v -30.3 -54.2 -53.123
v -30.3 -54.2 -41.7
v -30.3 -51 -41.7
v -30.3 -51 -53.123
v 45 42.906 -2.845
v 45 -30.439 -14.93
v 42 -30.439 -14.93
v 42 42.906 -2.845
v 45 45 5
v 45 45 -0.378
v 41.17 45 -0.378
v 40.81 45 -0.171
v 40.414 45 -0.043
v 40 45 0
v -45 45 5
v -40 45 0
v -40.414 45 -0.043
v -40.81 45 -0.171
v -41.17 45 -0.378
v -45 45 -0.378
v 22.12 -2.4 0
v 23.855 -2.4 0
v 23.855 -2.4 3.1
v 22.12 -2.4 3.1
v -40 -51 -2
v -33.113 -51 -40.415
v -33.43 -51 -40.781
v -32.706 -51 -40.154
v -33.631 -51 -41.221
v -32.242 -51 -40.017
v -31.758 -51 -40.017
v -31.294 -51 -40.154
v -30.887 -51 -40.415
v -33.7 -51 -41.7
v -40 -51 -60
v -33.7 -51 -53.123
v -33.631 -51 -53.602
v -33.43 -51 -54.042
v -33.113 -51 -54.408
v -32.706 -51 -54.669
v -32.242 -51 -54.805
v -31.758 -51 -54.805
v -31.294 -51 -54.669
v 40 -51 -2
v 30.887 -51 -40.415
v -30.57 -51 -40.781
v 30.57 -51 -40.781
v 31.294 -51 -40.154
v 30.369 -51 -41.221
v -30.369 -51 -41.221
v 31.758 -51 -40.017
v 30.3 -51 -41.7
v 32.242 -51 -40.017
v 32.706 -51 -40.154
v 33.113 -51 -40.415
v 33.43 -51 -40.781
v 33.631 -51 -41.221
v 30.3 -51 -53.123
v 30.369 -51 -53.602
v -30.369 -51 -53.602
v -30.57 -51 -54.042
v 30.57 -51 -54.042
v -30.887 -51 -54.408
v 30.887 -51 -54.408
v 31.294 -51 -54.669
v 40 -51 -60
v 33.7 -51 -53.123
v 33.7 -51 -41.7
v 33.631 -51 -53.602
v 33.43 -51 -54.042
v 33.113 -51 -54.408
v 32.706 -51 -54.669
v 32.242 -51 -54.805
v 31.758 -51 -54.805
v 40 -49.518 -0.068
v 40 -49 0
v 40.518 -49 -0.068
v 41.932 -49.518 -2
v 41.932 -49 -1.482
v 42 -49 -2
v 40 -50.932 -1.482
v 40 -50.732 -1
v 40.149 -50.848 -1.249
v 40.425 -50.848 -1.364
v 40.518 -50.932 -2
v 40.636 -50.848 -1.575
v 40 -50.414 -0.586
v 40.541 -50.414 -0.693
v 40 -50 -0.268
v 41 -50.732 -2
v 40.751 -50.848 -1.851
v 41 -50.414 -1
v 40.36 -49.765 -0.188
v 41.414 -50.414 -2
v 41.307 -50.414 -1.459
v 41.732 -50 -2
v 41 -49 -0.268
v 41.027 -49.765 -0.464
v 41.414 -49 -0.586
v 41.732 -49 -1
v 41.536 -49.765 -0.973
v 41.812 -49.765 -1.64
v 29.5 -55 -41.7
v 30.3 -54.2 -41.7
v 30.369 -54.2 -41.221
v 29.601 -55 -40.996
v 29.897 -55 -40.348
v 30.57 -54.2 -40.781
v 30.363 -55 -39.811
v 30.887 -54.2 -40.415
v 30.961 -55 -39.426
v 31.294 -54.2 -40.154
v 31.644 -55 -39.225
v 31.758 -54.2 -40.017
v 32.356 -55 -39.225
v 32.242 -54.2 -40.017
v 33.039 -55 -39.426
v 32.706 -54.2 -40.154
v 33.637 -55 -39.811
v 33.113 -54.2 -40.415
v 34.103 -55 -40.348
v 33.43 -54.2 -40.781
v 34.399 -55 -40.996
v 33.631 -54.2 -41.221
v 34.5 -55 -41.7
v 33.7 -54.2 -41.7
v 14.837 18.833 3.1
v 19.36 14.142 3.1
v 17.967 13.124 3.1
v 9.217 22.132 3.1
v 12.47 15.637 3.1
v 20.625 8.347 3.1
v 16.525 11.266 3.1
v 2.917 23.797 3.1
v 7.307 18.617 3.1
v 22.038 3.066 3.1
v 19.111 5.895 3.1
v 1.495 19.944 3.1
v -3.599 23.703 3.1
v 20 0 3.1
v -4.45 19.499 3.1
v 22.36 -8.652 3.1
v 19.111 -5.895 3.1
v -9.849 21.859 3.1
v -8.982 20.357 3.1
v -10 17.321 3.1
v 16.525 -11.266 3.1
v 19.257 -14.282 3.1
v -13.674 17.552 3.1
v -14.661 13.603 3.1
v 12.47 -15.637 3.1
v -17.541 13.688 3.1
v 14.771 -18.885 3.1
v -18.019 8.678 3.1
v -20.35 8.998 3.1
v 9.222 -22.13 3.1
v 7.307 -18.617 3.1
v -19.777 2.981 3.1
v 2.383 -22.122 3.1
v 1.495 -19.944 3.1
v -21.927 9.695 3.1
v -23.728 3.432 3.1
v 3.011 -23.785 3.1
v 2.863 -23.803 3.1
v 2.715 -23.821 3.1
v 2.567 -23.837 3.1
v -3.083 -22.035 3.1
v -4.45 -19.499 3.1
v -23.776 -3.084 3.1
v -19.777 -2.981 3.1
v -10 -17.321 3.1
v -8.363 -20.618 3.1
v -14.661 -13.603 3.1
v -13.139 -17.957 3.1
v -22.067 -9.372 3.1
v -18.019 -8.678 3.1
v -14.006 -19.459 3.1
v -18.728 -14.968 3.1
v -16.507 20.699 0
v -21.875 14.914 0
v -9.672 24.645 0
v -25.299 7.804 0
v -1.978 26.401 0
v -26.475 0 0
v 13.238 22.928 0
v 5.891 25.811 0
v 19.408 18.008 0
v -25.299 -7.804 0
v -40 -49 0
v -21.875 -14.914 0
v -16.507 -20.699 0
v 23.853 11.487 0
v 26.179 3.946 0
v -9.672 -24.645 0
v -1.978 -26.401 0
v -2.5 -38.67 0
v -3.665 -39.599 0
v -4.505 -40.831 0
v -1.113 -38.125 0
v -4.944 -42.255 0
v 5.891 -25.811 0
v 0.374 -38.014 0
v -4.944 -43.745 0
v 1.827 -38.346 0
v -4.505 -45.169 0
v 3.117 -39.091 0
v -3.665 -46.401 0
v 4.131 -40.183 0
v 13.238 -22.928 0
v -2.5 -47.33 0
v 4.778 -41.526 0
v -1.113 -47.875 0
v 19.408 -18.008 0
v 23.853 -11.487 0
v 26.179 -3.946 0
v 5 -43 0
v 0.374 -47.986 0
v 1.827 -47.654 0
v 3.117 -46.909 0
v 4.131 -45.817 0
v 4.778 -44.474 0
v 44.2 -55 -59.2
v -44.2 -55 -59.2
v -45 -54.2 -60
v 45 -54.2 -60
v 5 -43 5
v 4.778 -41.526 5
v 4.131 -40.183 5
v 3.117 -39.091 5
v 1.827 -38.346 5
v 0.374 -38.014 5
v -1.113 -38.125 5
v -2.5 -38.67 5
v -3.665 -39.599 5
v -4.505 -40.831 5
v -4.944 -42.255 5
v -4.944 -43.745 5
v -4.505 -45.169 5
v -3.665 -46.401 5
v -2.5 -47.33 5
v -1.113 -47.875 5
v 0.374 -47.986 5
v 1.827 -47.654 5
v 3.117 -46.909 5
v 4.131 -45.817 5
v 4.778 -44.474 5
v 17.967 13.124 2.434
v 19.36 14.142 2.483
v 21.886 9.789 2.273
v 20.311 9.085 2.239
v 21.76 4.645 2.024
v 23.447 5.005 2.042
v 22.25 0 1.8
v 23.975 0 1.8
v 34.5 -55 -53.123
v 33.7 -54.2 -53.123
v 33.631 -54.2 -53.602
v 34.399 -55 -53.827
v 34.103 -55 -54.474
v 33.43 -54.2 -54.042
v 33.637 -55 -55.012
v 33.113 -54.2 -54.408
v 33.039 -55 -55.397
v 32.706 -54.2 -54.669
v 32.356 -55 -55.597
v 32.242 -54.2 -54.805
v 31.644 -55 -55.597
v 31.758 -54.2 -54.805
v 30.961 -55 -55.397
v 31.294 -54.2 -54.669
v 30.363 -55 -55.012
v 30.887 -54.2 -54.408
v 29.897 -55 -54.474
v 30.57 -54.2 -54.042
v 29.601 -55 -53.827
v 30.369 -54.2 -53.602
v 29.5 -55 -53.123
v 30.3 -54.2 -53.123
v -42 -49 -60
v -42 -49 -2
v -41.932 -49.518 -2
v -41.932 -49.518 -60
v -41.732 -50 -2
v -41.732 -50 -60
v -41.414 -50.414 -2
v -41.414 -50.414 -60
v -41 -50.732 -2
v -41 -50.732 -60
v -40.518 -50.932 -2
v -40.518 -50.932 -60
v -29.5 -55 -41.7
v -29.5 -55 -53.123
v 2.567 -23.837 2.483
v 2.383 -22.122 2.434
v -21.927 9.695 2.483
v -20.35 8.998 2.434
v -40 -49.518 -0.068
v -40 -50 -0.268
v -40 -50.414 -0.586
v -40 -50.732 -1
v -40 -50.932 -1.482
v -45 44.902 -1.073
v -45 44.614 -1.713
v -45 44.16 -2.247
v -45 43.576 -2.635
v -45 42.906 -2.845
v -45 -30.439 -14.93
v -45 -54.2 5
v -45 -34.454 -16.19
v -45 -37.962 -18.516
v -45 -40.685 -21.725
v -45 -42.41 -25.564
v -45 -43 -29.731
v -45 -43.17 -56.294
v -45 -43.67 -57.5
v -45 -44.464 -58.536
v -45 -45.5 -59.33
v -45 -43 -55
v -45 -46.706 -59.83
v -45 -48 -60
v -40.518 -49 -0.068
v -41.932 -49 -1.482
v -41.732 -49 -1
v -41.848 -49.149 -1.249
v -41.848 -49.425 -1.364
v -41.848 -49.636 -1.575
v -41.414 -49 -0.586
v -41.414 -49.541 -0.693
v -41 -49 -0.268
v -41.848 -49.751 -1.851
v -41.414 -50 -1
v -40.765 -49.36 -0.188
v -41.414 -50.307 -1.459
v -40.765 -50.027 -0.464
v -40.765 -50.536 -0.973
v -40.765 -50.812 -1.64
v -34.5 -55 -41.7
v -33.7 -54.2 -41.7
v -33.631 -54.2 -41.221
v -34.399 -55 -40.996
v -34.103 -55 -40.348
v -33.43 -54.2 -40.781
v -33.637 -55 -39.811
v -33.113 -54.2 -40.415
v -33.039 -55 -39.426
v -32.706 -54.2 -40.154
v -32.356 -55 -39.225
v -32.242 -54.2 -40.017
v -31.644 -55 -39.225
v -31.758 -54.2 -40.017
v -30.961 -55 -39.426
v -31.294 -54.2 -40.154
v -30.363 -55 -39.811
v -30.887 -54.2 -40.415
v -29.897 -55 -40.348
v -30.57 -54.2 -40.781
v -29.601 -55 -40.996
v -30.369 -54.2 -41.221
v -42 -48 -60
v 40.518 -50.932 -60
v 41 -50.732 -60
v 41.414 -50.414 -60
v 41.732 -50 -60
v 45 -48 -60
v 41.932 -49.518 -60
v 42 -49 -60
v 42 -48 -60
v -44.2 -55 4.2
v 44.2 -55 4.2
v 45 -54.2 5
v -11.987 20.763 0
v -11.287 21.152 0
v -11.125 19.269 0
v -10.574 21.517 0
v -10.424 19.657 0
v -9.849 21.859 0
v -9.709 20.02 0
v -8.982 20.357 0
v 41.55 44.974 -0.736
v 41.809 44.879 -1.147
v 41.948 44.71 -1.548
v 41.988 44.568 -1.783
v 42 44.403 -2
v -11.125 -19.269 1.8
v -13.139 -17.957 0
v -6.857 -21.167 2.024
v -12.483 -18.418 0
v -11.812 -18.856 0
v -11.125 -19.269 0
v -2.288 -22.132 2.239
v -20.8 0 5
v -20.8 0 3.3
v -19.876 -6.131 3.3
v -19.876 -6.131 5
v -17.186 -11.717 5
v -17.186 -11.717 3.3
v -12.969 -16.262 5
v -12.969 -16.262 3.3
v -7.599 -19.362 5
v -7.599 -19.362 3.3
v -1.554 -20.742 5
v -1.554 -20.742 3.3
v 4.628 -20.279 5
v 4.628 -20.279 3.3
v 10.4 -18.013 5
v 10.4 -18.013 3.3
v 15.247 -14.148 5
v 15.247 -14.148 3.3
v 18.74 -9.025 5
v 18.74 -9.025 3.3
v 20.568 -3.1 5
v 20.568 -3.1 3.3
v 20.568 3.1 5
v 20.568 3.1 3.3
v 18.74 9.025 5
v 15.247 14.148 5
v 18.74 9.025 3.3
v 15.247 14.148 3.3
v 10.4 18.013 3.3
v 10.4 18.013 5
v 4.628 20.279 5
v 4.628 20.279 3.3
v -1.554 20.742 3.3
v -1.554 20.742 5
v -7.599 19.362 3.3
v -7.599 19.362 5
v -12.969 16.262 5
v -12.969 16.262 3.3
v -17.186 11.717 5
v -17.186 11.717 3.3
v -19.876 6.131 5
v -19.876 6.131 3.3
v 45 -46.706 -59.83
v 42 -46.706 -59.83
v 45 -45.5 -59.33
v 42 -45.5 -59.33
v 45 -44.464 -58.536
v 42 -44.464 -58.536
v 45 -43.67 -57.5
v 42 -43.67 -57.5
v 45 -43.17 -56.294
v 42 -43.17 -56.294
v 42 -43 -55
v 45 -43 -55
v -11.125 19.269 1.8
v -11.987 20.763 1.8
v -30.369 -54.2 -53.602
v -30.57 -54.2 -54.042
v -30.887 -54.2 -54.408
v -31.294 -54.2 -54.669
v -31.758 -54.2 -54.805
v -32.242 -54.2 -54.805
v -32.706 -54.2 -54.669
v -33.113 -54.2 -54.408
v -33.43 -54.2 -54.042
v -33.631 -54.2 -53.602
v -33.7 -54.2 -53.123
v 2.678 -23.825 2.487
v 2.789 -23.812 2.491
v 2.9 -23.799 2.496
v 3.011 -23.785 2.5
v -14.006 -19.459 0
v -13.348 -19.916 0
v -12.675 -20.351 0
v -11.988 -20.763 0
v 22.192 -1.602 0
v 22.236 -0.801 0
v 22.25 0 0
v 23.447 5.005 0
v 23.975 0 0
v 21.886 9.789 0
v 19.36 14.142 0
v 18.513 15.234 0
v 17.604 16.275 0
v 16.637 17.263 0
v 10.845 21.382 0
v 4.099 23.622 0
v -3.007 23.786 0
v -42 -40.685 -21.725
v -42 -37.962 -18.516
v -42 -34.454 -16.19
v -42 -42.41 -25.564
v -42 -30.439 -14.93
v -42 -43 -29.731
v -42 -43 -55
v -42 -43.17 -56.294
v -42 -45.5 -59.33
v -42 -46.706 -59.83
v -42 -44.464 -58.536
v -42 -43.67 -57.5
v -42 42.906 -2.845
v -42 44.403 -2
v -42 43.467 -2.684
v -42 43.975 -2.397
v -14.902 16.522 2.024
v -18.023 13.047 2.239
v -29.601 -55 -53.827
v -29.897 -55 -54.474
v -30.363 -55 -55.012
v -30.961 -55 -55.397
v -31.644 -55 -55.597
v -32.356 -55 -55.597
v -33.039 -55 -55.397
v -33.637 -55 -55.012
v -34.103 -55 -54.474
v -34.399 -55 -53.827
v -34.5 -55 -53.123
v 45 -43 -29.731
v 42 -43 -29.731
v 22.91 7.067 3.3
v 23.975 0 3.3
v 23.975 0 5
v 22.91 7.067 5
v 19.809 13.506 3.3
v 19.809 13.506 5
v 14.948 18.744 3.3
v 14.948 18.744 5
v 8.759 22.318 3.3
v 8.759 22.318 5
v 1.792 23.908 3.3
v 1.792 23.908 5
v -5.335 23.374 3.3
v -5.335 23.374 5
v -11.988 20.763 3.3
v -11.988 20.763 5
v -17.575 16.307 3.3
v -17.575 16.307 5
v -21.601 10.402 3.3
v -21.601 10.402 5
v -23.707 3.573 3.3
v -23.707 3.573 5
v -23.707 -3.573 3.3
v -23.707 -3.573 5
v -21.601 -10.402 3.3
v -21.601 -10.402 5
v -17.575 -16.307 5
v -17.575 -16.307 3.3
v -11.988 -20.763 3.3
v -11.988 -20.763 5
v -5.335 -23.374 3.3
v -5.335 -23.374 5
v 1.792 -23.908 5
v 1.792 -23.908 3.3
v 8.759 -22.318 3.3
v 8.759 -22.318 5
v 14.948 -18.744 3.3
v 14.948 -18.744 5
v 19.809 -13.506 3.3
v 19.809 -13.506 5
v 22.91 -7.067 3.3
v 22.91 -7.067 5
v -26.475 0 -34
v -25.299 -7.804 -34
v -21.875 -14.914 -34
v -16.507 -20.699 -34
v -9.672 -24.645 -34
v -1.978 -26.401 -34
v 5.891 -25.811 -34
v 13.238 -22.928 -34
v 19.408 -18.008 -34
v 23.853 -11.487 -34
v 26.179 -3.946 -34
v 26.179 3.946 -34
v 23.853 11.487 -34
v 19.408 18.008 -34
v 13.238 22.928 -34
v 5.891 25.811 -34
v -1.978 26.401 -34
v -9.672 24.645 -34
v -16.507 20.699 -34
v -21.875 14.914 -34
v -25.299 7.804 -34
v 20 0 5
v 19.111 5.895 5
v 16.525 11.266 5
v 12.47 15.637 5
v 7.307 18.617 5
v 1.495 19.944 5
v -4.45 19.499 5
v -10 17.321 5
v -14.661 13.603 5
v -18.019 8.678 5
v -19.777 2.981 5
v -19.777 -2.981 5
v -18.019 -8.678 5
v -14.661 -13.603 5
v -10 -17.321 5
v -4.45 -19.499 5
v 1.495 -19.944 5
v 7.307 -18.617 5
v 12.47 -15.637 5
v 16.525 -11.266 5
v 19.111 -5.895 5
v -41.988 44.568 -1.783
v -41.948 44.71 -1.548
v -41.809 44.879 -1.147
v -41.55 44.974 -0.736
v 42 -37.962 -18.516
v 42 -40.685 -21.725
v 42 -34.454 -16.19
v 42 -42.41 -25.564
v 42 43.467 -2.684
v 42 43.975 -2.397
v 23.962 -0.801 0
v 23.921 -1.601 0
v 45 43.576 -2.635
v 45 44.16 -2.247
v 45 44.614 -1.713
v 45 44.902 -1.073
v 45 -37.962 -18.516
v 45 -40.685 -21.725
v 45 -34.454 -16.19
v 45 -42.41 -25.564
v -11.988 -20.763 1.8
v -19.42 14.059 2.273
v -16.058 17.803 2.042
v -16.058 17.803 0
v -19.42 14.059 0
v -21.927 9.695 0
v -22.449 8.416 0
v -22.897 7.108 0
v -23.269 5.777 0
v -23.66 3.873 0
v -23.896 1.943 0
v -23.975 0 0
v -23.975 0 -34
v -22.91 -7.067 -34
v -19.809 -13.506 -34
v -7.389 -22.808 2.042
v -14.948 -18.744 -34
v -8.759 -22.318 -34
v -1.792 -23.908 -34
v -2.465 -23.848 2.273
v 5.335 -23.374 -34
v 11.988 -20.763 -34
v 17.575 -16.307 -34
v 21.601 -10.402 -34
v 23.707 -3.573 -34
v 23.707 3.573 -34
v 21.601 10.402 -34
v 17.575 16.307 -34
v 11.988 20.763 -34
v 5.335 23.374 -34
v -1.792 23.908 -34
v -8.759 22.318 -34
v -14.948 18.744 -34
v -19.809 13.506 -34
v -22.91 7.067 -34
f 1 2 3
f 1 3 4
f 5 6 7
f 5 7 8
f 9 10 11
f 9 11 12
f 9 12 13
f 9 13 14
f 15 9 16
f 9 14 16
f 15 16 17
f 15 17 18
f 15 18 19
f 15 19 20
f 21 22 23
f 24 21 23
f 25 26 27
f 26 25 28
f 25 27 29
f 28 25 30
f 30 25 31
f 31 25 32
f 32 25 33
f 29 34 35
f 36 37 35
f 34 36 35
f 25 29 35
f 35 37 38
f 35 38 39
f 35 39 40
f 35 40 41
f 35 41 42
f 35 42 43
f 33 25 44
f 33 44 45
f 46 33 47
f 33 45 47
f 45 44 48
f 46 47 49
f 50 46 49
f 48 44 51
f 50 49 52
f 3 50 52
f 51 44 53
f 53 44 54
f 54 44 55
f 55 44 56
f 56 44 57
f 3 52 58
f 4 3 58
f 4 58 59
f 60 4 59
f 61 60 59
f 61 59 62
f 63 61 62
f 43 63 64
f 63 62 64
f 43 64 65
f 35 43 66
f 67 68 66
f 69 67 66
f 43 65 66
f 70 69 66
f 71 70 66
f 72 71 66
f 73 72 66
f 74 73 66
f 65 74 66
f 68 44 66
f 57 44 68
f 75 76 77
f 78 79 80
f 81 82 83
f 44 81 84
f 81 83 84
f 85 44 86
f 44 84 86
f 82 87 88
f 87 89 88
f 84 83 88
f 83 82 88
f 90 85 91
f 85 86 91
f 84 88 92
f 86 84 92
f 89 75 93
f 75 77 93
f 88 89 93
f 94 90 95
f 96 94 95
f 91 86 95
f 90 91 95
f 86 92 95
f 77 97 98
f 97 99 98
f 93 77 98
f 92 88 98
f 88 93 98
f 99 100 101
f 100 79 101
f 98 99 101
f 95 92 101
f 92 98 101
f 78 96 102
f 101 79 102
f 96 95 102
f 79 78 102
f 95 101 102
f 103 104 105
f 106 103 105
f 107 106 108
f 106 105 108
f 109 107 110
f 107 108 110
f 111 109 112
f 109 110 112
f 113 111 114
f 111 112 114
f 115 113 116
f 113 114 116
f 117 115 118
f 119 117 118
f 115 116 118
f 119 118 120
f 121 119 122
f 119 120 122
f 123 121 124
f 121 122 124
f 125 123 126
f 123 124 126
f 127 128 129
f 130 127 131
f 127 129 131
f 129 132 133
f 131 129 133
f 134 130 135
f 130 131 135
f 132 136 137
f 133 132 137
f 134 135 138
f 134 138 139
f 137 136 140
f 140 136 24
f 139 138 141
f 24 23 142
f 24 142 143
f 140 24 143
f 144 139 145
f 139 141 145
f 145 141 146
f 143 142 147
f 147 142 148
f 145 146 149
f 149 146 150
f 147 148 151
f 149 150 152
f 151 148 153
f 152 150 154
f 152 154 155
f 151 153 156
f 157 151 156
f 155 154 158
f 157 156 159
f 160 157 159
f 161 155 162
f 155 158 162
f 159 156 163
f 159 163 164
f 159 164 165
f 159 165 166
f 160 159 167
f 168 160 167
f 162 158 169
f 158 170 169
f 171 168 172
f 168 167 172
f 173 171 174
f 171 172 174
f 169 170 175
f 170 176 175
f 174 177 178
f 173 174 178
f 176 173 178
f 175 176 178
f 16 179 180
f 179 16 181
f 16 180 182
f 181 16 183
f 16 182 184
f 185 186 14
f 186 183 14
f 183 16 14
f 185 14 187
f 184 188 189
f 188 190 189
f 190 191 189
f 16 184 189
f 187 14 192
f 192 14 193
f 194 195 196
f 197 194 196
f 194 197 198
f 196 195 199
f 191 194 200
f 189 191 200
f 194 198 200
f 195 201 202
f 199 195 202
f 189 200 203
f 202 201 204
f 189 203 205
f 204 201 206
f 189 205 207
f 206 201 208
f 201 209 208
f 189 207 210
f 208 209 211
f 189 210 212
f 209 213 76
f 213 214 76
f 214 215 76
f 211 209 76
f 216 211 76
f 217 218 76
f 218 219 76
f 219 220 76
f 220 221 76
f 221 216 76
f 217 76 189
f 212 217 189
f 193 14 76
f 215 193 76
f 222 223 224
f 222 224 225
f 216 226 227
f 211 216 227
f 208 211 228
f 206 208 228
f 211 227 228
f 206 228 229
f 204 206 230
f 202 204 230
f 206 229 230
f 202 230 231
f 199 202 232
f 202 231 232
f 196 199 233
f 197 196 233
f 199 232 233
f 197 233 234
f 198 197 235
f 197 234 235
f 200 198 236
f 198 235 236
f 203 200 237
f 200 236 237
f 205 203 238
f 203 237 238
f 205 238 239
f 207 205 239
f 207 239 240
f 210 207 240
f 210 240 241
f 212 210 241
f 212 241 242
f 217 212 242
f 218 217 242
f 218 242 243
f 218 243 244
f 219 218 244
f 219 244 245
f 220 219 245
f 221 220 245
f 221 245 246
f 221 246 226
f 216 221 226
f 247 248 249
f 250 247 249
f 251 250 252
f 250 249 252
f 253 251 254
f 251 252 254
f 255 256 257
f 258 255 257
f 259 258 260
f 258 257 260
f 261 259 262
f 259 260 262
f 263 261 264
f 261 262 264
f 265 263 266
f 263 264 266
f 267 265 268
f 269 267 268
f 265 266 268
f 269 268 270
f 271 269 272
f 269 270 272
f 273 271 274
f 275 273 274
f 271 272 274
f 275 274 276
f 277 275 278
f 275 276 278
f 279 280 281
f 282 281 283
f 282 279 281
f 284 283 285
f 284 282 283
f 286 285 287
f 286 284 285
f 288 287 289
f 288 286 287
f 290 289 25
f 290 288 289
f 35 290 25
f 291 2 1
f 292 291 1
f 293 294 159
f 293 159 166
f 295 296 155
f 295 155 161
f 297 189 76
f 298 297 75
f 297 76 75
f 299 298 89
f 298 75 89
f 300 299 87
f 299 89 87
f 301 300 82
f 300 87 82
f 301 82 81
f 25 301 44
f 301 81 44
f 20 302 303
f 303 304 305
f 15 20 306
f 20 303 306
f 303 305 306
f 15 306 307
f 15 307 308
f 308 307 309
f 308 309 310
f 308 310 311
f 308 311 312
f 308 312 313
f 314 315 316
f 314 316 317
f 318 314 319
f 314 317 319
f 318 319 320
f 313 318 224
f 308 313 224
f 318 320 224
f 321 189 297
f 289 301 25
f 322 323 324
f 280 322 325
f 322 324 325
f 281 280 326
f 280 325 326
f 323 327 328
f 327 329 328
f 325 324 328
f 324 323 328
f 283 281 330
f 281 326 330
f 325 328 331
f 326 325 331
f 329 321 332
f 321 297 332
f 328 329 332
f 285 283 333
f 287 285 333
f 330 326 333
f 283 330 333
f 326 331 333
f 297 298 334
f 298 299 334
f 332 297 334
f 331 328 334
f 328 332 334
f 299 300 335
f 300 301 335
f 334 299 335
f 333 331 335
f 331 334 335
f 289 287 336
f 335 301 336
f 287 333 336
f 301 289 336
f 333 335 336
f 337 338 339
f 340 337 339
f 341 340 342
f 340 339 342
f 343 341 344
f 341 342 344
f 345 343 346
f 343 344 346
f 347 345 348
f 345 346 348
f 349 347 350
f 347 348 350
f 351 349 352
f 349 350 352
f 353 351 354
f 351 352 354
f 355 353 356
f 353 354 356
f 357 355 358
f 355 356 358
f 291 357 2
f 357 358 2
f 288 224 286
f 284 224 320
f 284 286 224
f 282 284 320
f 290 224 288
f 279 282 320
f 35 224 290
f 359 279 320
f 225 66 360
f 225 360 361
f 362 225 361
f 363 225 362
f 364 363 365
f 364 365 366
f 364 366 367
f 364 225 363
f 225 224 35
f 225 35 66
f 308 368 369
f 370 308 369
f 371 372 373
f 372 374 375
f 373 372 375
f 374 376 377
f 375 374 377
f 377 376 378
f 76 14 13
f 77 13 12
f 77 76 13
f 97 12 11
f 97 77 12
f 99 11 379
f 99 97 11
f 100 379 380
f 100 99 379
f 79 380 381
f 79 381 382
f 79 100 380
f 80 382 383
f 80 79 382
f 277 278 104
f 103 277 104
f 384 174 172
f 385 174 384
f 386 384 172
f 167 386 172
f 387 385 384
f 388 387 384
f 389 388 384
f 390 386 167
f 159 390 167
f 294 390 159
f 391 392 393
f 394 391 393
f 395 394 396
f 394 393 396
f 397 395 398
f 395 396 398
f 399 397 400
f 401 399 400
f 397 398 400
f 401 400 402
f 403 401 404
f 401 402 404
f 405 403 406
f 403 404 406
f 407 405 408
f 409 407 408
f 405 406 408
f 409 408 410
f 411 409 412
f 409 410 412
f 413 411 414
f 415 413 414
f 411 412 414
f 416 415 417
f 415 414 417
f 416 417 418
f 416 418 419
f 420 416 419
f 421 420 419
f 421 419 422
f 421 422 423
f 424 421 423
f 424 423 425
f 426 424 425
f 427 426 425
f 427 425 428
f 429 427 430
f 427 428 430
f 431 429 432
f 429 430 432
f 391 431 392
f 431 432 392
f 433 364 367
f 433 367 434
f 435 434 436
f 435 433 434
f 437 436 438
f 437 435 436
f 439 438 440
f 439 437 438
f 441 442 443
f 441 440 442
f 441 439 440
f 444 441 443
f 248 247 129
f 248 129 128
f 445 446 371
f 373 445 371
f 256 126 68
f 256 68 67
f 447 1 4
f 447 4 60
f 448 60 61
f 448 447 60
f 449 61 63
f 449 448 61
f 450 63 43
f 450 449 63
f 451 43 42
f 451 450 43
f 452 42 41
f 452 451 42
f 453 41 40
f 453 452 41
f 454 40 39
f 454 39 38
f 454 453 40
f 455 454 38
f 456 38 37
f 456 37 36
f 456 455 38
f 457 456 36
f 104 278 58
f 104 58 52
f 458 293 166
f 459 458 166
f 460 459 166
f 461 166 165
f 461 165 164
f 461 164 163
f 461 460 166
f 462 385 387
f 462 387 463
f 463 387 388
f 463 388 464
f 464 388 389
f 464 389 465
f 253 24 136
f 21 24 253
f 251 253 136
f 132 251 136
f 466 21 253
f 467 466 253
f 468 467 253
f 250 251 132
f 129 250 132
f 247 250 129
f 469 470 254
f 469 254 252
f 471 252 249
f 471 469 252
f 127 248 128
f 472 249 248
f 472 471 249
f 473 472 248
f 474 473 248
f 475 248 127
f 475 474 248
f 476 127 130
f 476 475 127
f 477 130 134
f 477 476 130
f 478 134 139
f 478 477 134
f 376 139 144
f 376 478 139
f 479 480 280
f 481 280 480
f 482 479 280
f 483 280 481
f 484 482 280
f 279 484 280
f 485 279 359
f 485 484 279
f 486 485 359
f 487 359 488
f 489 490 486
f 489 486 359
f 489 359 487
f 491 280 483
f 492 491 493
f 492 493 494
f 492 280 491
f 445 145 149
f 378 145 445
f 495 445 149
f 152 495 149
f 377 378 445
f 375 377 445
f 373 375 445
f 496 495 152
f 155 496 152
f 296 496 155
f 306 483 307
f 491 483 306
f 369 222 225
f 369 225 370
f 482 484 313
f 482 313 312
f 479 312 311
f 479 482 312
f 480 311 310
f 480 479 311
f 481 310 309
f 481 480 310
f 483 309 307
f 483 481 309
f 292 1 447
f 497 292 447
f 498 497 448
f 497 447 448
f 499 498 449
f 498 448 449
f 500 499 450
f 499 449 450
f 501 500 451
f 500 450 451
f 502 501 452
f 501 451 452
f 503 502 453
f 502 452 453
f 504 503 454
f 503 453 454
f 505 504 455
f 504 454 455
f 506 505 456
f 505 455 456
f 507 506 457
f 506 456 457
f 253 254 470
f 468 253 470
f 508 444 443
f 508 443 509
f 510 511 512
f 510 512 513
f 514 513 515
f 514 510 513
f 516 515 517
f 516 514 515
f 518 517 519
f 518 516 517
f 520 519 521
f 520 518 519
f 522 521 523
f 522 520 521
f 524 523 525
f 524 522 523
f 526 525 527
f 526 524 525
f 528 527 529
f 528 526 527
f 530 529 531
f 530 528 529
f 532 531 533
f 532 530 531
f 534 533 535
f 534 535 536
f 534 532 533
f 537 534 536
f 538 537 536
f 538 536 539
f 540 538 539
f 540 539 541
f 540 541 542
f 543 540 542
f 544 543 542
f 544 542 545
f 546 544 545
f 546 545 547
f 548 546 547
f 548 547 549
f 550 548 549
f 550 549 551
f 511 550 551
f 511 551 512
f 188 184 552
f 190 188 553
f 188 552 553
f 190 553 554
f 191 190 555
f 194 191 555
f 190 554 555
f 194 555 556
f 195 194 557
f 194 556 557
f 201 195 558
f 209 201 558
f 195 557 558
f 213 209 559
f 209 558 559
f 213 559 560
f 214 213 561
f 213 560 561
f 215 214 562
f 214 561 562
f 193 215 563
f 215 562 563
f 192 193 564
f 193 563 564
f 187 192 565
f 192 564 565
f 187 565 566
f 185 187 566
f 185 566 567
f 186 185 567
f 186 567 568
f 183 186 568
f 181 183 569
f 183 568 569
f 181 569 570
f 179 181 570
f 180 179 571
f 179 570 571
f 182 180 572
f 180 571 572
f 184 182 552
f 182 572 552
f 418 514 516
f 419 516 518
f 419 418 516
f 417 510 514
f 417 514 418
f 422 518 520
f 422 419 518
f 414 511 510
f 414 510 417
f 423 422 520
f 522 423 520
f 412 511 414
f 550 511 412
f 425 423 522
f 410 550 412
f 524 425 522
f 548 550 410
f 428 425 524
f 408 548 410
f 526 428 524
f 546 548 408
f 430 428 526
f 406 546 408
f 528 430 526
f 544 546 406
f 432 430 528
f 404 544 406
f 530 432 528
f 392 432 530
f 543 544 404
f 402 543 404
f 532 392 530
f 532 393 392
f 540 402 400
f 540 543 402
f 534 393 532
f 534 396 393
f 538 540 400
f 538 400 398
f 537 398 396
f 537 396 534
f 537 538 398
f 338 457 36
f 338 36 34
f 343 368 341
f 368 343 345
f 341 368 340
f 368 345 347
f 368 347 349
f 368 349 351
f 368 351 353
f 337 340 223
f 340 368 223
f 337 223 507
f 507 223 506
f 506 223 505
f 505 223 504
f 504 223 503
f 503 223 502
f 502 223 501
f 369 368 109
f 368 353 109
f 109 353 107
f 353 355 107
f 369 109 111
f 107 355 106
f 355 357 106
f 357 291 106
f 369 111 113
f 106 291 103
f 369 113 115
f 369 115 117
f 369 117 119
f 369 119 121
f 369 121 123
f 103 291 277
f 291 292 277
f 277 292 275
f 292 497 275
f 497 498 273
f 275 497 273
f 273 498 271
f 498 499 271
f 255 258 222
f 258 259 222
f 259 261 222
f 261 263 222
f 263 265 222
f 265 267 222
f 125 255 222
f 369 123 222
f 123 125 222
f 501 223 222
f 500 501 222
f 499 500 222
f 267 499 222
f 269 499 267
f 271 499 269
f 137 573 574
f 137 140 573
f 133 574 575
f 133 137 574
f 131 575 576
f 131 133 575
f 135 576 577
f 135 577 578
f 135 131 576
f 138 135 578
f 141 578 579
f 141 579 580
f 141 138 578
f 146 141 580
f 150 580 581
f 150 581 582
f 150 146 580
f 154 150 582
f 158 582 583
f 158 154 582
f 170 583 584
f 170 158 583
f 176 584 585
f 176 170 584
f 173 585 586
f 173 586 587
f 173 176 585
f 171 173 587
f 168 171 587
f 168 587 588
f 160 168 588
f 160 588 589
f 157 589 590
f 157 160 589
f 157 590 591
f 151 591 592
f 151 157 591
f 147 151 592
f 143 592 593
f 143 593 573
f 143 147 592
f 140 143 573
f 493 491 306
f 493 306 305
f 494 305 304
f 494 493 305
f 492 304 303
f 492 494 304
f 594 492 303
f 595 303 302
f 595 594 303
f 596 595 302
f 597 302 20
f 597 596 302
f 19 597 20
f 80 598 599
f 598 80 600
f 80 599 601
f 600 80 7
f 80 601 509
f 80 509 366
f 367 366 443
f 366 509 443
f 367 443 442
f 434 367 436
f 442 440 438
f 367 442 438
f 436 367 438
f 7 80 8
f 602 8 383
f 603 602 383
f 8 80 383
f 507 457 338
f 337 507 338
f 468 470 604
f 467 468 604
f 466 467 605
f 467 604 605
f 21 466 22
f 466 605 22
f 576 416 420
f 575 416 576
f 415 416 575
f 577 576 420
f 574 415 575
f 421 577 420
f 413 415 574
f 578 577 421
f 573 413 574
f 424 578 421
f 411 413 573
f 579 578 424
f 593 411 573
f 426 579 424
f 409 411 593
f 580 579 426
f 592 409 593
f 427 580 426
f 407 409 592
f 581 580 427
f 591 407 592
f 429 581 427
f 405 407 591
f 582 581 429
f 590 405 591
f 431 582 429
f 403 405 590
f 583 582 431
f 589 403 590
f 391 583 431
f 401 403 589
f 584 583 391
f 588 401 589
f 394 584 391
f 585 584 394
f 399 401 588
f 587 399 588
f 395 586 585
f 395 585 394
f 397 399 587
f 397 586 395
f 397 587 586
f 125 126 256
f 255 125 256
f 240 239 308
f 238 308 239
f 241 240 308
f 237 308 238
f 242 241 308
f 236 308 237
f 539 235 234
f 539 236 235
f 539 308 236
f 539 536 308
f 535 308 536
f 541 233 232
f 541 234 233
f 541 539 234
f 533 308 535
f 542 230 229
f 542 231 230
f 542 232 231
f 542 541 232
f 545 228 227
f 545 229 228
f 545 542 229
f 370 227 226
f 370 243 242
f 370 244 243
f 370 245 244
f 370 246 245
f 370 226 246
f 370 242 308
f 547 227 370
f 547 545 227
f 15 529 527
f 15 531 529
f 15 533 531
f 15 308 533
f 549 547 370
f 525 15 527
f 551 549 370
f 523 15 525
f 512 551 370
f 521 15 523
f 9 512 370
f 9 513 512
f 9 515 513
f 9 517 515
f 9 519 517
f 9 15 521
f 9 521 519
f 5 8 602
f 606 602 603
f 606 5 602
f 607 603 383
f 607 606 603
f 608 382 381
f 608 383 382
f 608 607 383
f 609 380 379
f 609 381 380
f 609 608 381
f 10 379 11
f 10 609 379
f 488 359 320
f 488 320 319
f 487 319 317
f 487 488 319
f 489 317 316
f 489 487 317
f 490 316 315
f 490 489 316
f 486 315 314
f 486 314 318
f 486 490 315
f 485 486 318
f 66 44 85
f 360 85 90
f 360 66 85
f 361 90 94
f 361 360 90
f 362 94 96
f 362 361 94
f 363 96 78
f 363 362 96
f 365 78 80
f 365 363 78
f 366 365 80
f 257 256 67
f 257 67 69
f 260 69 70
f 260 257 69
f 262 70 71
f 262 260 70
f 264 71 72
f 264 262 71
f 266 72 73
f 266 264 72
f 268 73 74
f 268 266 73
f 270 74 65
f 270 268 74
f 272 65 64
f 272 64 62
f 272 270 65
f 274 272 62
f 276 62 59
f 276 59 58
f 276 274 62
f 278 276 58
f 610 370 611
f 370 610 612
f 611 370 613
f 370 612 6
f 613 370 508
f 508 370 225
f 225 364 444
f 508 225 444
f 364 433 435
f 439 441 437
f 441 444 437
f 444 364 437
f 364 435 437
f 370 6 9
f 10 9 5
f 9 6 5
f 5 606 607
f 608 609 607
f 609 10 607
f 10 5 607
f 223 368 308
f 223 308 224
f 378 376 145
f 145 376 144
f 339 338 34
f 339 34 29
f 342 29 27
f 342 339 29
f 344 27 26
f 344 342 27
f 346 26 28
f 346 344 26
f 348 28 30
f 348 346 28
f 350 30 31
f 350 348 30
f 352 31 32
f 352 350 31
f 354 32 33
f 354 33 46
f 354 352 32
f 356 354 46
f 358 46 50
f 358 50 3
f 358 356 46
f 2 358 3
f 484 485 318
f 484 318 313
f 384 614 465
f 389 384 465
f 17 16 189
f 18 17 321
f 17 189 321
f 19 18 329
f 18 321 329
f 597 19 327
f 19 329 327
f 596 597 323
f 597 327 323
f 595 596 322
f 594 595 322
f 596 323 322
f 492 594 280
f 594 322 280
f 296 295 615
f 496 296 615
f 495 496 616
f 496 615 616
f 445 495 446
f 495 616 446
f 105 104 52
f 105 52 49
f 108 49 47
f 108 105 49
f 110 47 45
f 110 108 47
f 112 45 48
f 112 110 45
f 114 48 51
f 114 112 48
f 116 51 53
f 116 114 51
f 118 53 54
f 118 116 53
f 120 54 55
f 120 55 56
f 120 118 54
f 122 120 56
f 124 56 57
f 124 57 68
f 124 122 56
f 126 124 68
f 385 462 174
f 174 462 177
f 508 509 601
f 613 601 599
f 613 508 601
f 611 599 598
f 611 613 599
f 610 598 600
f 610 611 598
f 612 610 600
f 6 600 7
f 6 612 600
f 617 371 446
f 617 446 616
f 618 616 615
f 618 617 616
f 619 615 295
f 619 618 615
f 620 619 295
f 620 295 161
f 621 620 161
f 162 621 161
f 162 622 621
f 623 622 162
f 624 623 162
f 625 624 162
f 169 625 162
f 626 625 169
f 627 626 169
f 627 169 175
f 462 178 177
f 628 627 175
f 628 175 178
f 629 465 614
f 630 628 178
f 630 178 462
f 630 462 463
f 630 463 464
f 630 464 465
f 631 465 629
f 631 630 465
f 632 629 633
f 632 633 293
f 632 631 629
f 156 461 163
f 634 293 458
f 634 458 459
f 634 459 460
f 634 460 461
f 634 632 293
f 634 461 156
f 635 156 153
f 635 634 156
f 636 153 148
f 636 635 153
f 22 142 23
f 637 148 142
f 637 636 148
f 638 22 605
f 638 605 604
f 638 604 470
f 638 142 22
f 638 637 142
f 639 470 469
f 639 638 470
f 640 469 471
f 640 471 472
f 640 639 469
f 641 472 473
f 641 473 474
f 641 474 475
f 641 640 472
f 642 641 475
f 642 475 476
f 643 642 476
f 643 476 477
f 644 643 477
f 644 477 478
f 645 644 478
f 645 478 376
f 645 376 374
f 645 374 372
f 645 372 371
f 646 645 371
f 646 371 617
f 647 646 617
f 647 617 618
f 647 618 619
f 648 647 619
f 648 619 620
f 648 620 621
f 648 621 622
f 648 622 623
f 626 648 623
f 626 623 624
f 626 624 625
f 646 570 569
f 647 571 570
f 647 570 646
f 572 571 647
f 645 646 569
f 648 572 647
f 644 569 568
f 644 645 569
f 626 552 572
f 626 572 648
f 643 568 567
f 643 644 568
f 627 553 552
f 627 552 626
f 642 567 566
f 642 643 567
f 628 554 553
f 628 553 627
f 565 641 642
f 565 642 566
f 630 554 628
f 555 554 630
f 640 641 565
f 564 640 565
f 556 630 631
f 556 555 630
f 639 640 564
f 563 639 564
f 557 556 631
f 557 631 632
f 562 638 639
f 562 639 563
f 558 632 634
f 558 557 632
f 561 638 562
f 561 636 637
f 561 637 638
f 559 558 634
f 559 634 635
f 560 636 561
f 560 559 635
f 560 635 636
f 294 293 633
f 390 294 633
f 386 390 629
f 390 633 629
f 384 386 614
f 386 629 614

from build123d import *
from build123d.topology import SkipClean

# Parameters (mm, degrees)
SKETCH1_R                = 23.975
BOSS_EXTRUDE1_DEPTH      = 5
BOSS_EXTRUDE6_DEPTH      = 45
CUT_EXTRUDE3_DEPTH       = 42
BOSS_EXTRUDE3_DEPTH      = 10
CUT_EXTRUDE2_DEPTH       = 94.005376189
CIRPATTERN1_COUNT        = 3
SKETCH3_R                = 22.25
CUT_EXTRUDE1_DEPTH       = 94.005376189
BOSS_EXTRUDE4_START      = -0.2
SKETCH5_R                = 23.975
SKETCH5_R_2              = 20
BOSS_EXTRUDE4_DEPTH      = 0.2
SKETCH6_R                = 20.8
SKETCH6_R_2              = 20
BOSS_EXTRUDE5_DEPTH      = 1.7
SKETCH8_W                = 34
SKETCH8_H                = 2.5
M3_START                 = -55
M3_CLEARANCE_SLOT3_DEPTH = 4
SKETCH14_R               = 5
CUT_EXTRUDE4_DEPTH       = 97.306801421
FILLET3_R                = 2
CHAMFER1_SIZE            = 0.8


# Read off the part's stored shape, not the designer's step: M3 Clearance Slot3
with BuildPart() as part:
    # Sketch1 → Boss-Extrude1 (new body)
    with BuildSketch(Plane.XY):
        Polygon((-45, -45), (-45, -55), (45, -55), (45, -45), (45, 45), (-45, 45), align=None)
        Circle(SKETCH1_R, mode=Mode.SUBTRACT)
    extrude(amount=BOSS_EXTRUDE1_DEPTH)

    # Sketch9 → Boss-Extrude6 (add, symmetric)
    with BuildSketch(Plane(origin=(0, 0, 0), x_dir=(0, 0, -1), z_dir=(1, 0, 0))):
        with BuildLine():
            Line((0, 45), (0, -55))
            Line((0, -55), (60, -55))
            Line((60, -55), (60, -48))
            ThreePointArc((60, -48), (58.535533906, -44.464466094), (55, -43))
            Line((55, -43), (29.730670818, -43))
            ThreePointArc((29.730670818, -43), (20.024502844, -39.436358829), (14.930241511, -30.438707102))
            Line((14.930241511, -30.438707102), (2.844959748, 42.906451184))
            ThreePointArc((2.844959748, 42.906451184), (1.995916193, 44.406059805), (0.37822153, 45))
            Line((0.37822153, 45), (0, 45))
        make_face()
    extrude(amount=BOSS_EXTRUDE6_DEPTH, both=True)

    # Sketch10 → Cut-Extrude3 (cut, symmetric)
    with BuildSketch(Plane(origin=(0, 0, 0), x_dir=(0, 0, -1), z_dir=(1, 0, 0))):
        Polygon((0, 45), (0, -51), (62.788214541, -51), (2.5, 45), align=None)
    extrude(amount=CUT_EXTRUDE3_DEPTH, both=True, mode=Mode.SUBTRACT)

    # Sketch2 → Boss-Extrude3 (add)
    with BuildSketch(Plane.ZY.offset(-23.975)):
        Polygon((0, -2.4), (3.3, -2.4), (3.3, 14.5), (2.5, 14.5), (1.8, 0), (0, 0), align=None)
    boss_extrude3 = extrude(amount=BOSS_EXTRUDE3_DEPTH)

    # Sketch4 → Cut-Extrude2 (cut, through all)
    with BuildSketch(Plane.XY):
        with BuildLine():
            Line((16.63749335, 17.262515461), (0, 0))
            Line((0, 0), (19.359883897, 14.141977248))
            ThreePointArc((19.359883897, 14.141977248), (18.066190297, 15.761135529), (16.63749335, 17.262515461))
        make_face()
    cut_extrude2 = extrude(amount=CUT_EXTRUDE2_DEPTH, mode=Mode.SUBTRACT)

    # CirPattern1: Boss-Extrude3, Cut-Extrude2 ×3 about axis
    cirpattern1_axis = Axis((0, 0, 0), (0, 0, 1))
    add([boss_extrude3.rotate(cirpattern1_axis, i * 360 / CIRPATTERN1_COUNT) for i in range(1, CIRPATTERN1_COUNT)])
    add([cut_extrude2.rotate(cirpattern1_axis, i * 360 / CIRPATTERN1_COUNT) for i in range(1, CIRPATTERN1_COUNT)], mode=Mode.SUBTRACT)

    # Sketch3 → Cut-Extrude1 (cut, through all)
    with BuildSketch(Plane.XY):
        Circle(SKETCH3_R)
    extrude(amount=CUT_EXTRUDE1_DEPTH, mode=Mode.SUBTRACT)

    # Sketch5 → Boss-Extrude4 (add)
    with BuildSketch(Plane.XY.offset(3.3).offset(BOSS_EXTRUDE4_START)):
        with Locations(Location((0, 0, 0), (0, 0, 180))):
            Circle(SKETCH5_R)
        Circle(SKETCH5_R_2, mode=Mode.SUBTRACT)
    extrude(amount=BOSS_EXTRUDE4_DEPTH)

    # Sketch6 → Boss-Extrude5 (add)
    with BuildSketch(Plane.XY.offset(3.3)):
        with Locations(Location((0, 0, 0), (0, 0, 180))):
            Circle(SKETCH6_R)
        Circle(SKETCH6_R_2, mode=Mode.SUBTRACT)
    extrude(amount=BOSS_EXTRUDE5_DEPTH)

    # Sketch8 → Revolve1 (revolve)
    with SkipClean():  # the faces are left unmerged after this step: merging them gives an invalid solid
        with BuildSketch(Plane(origin=(0, 0, 0), x_dir=(0, 0, -1), z_dir=(1, 0, 0)), mode=Mode.PRIVATE) as revolve1_sk:
            with Locations((17, 25.225)):
                Rectangle(SKETCH8_W, SKETCH8_H)
        revolve(revolve1_sk.sketch.rotate(Axis((0, 0, 0), (0, 0, 1)), 90), axis=Axis((0, 0, 0), (0, 0, 1)))

    # M3 Clearance Slot3 outline → M3 Clearance Slot3 (cut)
    with SkipClean():  # the faces are left unmerged after this step: merging them gives an invalid solid
        with BuildSketch(Plane(origin=(0, 0, 0), x_dir=(1, 0, 0), z_dir=(0, 1, 0)).offset(M3_START)):
            with BuildLine():
                Line((33.7, 41.7), (33.7, 53.122760777))
                ThreePointArc((33.7, 53.122760777), (32, 54.822760777), (30.3, 53.122760777))
                Line((30.3, 53.122760777), (30.3, 41.7))
                ThreePointArc((30.3, 41.7), (32, 40), (33.7, 41.7))
            make_face()
            with BuildLine():
                Line((-30.3, 41.7), (-30.3, 53.122760777))
                ThreePointArc((-30.3, 53.122760777), (-32, 54.822760777), (-33.7, 53.122760777))
                Line((-33.7, 53.122760777), (-33.7, 41.7))
                ThreePointArc((-33.7, 41.7), (-32, 40), (-30.3, 41.7))
            make_face()
        extrude(amount=M3_CLEARANCE_SLOT3_DEPTH, mode=Mode.SUBTRACT)

    # Sketch14 → Cut-Extrude4 (cut, through all)
    with SkipClean():  # the faces are left unmerged after this step: merging them gives an invalid solid
        with BuildSketch(Plane.XY.offset(5)):
            with Locations((0, -43)):
                Circle(SKETCH14_R)
        extrude(amount=-CUT_EXTRUDE4_DEPTH, mode=Mode.SUBTRACT)

    # Fillet3
    fillet3_edges = [part.edges().sort_by_distance(p)[0] for p in [
        (42, -3, 0),
        (0, -51, 0),
        (-42, -3, 0),
        (42, -51, -30),
        (-42, -51, -30),
    ]]
    fillet(fillet3_edges, radius=FILLET3_R)

    # Chamfer1
    chamfer1_edges = [part.edges().sort_by_distance(p)[0] for p in [
        (45, -55, -27.5),
        (-45, -55, -27.5),
        (0, -55, 5),
        (0, -55, -60),
        (32, -55, -54.822760777),
        (32, -55, -40),
        (30.3, -55, -47.411380389),
        (33.7, -55, -47.411380389),
        (-33.7, -55, -47.411380389),
        (-32, -55, -54.822760777),
        (-32, -55, -40),
        (-30.3, -55, -47.411380389),
    ]]
    chamfer(chamfer1_edges, length=CHAMFER1_SIZE)


solid = part.part
